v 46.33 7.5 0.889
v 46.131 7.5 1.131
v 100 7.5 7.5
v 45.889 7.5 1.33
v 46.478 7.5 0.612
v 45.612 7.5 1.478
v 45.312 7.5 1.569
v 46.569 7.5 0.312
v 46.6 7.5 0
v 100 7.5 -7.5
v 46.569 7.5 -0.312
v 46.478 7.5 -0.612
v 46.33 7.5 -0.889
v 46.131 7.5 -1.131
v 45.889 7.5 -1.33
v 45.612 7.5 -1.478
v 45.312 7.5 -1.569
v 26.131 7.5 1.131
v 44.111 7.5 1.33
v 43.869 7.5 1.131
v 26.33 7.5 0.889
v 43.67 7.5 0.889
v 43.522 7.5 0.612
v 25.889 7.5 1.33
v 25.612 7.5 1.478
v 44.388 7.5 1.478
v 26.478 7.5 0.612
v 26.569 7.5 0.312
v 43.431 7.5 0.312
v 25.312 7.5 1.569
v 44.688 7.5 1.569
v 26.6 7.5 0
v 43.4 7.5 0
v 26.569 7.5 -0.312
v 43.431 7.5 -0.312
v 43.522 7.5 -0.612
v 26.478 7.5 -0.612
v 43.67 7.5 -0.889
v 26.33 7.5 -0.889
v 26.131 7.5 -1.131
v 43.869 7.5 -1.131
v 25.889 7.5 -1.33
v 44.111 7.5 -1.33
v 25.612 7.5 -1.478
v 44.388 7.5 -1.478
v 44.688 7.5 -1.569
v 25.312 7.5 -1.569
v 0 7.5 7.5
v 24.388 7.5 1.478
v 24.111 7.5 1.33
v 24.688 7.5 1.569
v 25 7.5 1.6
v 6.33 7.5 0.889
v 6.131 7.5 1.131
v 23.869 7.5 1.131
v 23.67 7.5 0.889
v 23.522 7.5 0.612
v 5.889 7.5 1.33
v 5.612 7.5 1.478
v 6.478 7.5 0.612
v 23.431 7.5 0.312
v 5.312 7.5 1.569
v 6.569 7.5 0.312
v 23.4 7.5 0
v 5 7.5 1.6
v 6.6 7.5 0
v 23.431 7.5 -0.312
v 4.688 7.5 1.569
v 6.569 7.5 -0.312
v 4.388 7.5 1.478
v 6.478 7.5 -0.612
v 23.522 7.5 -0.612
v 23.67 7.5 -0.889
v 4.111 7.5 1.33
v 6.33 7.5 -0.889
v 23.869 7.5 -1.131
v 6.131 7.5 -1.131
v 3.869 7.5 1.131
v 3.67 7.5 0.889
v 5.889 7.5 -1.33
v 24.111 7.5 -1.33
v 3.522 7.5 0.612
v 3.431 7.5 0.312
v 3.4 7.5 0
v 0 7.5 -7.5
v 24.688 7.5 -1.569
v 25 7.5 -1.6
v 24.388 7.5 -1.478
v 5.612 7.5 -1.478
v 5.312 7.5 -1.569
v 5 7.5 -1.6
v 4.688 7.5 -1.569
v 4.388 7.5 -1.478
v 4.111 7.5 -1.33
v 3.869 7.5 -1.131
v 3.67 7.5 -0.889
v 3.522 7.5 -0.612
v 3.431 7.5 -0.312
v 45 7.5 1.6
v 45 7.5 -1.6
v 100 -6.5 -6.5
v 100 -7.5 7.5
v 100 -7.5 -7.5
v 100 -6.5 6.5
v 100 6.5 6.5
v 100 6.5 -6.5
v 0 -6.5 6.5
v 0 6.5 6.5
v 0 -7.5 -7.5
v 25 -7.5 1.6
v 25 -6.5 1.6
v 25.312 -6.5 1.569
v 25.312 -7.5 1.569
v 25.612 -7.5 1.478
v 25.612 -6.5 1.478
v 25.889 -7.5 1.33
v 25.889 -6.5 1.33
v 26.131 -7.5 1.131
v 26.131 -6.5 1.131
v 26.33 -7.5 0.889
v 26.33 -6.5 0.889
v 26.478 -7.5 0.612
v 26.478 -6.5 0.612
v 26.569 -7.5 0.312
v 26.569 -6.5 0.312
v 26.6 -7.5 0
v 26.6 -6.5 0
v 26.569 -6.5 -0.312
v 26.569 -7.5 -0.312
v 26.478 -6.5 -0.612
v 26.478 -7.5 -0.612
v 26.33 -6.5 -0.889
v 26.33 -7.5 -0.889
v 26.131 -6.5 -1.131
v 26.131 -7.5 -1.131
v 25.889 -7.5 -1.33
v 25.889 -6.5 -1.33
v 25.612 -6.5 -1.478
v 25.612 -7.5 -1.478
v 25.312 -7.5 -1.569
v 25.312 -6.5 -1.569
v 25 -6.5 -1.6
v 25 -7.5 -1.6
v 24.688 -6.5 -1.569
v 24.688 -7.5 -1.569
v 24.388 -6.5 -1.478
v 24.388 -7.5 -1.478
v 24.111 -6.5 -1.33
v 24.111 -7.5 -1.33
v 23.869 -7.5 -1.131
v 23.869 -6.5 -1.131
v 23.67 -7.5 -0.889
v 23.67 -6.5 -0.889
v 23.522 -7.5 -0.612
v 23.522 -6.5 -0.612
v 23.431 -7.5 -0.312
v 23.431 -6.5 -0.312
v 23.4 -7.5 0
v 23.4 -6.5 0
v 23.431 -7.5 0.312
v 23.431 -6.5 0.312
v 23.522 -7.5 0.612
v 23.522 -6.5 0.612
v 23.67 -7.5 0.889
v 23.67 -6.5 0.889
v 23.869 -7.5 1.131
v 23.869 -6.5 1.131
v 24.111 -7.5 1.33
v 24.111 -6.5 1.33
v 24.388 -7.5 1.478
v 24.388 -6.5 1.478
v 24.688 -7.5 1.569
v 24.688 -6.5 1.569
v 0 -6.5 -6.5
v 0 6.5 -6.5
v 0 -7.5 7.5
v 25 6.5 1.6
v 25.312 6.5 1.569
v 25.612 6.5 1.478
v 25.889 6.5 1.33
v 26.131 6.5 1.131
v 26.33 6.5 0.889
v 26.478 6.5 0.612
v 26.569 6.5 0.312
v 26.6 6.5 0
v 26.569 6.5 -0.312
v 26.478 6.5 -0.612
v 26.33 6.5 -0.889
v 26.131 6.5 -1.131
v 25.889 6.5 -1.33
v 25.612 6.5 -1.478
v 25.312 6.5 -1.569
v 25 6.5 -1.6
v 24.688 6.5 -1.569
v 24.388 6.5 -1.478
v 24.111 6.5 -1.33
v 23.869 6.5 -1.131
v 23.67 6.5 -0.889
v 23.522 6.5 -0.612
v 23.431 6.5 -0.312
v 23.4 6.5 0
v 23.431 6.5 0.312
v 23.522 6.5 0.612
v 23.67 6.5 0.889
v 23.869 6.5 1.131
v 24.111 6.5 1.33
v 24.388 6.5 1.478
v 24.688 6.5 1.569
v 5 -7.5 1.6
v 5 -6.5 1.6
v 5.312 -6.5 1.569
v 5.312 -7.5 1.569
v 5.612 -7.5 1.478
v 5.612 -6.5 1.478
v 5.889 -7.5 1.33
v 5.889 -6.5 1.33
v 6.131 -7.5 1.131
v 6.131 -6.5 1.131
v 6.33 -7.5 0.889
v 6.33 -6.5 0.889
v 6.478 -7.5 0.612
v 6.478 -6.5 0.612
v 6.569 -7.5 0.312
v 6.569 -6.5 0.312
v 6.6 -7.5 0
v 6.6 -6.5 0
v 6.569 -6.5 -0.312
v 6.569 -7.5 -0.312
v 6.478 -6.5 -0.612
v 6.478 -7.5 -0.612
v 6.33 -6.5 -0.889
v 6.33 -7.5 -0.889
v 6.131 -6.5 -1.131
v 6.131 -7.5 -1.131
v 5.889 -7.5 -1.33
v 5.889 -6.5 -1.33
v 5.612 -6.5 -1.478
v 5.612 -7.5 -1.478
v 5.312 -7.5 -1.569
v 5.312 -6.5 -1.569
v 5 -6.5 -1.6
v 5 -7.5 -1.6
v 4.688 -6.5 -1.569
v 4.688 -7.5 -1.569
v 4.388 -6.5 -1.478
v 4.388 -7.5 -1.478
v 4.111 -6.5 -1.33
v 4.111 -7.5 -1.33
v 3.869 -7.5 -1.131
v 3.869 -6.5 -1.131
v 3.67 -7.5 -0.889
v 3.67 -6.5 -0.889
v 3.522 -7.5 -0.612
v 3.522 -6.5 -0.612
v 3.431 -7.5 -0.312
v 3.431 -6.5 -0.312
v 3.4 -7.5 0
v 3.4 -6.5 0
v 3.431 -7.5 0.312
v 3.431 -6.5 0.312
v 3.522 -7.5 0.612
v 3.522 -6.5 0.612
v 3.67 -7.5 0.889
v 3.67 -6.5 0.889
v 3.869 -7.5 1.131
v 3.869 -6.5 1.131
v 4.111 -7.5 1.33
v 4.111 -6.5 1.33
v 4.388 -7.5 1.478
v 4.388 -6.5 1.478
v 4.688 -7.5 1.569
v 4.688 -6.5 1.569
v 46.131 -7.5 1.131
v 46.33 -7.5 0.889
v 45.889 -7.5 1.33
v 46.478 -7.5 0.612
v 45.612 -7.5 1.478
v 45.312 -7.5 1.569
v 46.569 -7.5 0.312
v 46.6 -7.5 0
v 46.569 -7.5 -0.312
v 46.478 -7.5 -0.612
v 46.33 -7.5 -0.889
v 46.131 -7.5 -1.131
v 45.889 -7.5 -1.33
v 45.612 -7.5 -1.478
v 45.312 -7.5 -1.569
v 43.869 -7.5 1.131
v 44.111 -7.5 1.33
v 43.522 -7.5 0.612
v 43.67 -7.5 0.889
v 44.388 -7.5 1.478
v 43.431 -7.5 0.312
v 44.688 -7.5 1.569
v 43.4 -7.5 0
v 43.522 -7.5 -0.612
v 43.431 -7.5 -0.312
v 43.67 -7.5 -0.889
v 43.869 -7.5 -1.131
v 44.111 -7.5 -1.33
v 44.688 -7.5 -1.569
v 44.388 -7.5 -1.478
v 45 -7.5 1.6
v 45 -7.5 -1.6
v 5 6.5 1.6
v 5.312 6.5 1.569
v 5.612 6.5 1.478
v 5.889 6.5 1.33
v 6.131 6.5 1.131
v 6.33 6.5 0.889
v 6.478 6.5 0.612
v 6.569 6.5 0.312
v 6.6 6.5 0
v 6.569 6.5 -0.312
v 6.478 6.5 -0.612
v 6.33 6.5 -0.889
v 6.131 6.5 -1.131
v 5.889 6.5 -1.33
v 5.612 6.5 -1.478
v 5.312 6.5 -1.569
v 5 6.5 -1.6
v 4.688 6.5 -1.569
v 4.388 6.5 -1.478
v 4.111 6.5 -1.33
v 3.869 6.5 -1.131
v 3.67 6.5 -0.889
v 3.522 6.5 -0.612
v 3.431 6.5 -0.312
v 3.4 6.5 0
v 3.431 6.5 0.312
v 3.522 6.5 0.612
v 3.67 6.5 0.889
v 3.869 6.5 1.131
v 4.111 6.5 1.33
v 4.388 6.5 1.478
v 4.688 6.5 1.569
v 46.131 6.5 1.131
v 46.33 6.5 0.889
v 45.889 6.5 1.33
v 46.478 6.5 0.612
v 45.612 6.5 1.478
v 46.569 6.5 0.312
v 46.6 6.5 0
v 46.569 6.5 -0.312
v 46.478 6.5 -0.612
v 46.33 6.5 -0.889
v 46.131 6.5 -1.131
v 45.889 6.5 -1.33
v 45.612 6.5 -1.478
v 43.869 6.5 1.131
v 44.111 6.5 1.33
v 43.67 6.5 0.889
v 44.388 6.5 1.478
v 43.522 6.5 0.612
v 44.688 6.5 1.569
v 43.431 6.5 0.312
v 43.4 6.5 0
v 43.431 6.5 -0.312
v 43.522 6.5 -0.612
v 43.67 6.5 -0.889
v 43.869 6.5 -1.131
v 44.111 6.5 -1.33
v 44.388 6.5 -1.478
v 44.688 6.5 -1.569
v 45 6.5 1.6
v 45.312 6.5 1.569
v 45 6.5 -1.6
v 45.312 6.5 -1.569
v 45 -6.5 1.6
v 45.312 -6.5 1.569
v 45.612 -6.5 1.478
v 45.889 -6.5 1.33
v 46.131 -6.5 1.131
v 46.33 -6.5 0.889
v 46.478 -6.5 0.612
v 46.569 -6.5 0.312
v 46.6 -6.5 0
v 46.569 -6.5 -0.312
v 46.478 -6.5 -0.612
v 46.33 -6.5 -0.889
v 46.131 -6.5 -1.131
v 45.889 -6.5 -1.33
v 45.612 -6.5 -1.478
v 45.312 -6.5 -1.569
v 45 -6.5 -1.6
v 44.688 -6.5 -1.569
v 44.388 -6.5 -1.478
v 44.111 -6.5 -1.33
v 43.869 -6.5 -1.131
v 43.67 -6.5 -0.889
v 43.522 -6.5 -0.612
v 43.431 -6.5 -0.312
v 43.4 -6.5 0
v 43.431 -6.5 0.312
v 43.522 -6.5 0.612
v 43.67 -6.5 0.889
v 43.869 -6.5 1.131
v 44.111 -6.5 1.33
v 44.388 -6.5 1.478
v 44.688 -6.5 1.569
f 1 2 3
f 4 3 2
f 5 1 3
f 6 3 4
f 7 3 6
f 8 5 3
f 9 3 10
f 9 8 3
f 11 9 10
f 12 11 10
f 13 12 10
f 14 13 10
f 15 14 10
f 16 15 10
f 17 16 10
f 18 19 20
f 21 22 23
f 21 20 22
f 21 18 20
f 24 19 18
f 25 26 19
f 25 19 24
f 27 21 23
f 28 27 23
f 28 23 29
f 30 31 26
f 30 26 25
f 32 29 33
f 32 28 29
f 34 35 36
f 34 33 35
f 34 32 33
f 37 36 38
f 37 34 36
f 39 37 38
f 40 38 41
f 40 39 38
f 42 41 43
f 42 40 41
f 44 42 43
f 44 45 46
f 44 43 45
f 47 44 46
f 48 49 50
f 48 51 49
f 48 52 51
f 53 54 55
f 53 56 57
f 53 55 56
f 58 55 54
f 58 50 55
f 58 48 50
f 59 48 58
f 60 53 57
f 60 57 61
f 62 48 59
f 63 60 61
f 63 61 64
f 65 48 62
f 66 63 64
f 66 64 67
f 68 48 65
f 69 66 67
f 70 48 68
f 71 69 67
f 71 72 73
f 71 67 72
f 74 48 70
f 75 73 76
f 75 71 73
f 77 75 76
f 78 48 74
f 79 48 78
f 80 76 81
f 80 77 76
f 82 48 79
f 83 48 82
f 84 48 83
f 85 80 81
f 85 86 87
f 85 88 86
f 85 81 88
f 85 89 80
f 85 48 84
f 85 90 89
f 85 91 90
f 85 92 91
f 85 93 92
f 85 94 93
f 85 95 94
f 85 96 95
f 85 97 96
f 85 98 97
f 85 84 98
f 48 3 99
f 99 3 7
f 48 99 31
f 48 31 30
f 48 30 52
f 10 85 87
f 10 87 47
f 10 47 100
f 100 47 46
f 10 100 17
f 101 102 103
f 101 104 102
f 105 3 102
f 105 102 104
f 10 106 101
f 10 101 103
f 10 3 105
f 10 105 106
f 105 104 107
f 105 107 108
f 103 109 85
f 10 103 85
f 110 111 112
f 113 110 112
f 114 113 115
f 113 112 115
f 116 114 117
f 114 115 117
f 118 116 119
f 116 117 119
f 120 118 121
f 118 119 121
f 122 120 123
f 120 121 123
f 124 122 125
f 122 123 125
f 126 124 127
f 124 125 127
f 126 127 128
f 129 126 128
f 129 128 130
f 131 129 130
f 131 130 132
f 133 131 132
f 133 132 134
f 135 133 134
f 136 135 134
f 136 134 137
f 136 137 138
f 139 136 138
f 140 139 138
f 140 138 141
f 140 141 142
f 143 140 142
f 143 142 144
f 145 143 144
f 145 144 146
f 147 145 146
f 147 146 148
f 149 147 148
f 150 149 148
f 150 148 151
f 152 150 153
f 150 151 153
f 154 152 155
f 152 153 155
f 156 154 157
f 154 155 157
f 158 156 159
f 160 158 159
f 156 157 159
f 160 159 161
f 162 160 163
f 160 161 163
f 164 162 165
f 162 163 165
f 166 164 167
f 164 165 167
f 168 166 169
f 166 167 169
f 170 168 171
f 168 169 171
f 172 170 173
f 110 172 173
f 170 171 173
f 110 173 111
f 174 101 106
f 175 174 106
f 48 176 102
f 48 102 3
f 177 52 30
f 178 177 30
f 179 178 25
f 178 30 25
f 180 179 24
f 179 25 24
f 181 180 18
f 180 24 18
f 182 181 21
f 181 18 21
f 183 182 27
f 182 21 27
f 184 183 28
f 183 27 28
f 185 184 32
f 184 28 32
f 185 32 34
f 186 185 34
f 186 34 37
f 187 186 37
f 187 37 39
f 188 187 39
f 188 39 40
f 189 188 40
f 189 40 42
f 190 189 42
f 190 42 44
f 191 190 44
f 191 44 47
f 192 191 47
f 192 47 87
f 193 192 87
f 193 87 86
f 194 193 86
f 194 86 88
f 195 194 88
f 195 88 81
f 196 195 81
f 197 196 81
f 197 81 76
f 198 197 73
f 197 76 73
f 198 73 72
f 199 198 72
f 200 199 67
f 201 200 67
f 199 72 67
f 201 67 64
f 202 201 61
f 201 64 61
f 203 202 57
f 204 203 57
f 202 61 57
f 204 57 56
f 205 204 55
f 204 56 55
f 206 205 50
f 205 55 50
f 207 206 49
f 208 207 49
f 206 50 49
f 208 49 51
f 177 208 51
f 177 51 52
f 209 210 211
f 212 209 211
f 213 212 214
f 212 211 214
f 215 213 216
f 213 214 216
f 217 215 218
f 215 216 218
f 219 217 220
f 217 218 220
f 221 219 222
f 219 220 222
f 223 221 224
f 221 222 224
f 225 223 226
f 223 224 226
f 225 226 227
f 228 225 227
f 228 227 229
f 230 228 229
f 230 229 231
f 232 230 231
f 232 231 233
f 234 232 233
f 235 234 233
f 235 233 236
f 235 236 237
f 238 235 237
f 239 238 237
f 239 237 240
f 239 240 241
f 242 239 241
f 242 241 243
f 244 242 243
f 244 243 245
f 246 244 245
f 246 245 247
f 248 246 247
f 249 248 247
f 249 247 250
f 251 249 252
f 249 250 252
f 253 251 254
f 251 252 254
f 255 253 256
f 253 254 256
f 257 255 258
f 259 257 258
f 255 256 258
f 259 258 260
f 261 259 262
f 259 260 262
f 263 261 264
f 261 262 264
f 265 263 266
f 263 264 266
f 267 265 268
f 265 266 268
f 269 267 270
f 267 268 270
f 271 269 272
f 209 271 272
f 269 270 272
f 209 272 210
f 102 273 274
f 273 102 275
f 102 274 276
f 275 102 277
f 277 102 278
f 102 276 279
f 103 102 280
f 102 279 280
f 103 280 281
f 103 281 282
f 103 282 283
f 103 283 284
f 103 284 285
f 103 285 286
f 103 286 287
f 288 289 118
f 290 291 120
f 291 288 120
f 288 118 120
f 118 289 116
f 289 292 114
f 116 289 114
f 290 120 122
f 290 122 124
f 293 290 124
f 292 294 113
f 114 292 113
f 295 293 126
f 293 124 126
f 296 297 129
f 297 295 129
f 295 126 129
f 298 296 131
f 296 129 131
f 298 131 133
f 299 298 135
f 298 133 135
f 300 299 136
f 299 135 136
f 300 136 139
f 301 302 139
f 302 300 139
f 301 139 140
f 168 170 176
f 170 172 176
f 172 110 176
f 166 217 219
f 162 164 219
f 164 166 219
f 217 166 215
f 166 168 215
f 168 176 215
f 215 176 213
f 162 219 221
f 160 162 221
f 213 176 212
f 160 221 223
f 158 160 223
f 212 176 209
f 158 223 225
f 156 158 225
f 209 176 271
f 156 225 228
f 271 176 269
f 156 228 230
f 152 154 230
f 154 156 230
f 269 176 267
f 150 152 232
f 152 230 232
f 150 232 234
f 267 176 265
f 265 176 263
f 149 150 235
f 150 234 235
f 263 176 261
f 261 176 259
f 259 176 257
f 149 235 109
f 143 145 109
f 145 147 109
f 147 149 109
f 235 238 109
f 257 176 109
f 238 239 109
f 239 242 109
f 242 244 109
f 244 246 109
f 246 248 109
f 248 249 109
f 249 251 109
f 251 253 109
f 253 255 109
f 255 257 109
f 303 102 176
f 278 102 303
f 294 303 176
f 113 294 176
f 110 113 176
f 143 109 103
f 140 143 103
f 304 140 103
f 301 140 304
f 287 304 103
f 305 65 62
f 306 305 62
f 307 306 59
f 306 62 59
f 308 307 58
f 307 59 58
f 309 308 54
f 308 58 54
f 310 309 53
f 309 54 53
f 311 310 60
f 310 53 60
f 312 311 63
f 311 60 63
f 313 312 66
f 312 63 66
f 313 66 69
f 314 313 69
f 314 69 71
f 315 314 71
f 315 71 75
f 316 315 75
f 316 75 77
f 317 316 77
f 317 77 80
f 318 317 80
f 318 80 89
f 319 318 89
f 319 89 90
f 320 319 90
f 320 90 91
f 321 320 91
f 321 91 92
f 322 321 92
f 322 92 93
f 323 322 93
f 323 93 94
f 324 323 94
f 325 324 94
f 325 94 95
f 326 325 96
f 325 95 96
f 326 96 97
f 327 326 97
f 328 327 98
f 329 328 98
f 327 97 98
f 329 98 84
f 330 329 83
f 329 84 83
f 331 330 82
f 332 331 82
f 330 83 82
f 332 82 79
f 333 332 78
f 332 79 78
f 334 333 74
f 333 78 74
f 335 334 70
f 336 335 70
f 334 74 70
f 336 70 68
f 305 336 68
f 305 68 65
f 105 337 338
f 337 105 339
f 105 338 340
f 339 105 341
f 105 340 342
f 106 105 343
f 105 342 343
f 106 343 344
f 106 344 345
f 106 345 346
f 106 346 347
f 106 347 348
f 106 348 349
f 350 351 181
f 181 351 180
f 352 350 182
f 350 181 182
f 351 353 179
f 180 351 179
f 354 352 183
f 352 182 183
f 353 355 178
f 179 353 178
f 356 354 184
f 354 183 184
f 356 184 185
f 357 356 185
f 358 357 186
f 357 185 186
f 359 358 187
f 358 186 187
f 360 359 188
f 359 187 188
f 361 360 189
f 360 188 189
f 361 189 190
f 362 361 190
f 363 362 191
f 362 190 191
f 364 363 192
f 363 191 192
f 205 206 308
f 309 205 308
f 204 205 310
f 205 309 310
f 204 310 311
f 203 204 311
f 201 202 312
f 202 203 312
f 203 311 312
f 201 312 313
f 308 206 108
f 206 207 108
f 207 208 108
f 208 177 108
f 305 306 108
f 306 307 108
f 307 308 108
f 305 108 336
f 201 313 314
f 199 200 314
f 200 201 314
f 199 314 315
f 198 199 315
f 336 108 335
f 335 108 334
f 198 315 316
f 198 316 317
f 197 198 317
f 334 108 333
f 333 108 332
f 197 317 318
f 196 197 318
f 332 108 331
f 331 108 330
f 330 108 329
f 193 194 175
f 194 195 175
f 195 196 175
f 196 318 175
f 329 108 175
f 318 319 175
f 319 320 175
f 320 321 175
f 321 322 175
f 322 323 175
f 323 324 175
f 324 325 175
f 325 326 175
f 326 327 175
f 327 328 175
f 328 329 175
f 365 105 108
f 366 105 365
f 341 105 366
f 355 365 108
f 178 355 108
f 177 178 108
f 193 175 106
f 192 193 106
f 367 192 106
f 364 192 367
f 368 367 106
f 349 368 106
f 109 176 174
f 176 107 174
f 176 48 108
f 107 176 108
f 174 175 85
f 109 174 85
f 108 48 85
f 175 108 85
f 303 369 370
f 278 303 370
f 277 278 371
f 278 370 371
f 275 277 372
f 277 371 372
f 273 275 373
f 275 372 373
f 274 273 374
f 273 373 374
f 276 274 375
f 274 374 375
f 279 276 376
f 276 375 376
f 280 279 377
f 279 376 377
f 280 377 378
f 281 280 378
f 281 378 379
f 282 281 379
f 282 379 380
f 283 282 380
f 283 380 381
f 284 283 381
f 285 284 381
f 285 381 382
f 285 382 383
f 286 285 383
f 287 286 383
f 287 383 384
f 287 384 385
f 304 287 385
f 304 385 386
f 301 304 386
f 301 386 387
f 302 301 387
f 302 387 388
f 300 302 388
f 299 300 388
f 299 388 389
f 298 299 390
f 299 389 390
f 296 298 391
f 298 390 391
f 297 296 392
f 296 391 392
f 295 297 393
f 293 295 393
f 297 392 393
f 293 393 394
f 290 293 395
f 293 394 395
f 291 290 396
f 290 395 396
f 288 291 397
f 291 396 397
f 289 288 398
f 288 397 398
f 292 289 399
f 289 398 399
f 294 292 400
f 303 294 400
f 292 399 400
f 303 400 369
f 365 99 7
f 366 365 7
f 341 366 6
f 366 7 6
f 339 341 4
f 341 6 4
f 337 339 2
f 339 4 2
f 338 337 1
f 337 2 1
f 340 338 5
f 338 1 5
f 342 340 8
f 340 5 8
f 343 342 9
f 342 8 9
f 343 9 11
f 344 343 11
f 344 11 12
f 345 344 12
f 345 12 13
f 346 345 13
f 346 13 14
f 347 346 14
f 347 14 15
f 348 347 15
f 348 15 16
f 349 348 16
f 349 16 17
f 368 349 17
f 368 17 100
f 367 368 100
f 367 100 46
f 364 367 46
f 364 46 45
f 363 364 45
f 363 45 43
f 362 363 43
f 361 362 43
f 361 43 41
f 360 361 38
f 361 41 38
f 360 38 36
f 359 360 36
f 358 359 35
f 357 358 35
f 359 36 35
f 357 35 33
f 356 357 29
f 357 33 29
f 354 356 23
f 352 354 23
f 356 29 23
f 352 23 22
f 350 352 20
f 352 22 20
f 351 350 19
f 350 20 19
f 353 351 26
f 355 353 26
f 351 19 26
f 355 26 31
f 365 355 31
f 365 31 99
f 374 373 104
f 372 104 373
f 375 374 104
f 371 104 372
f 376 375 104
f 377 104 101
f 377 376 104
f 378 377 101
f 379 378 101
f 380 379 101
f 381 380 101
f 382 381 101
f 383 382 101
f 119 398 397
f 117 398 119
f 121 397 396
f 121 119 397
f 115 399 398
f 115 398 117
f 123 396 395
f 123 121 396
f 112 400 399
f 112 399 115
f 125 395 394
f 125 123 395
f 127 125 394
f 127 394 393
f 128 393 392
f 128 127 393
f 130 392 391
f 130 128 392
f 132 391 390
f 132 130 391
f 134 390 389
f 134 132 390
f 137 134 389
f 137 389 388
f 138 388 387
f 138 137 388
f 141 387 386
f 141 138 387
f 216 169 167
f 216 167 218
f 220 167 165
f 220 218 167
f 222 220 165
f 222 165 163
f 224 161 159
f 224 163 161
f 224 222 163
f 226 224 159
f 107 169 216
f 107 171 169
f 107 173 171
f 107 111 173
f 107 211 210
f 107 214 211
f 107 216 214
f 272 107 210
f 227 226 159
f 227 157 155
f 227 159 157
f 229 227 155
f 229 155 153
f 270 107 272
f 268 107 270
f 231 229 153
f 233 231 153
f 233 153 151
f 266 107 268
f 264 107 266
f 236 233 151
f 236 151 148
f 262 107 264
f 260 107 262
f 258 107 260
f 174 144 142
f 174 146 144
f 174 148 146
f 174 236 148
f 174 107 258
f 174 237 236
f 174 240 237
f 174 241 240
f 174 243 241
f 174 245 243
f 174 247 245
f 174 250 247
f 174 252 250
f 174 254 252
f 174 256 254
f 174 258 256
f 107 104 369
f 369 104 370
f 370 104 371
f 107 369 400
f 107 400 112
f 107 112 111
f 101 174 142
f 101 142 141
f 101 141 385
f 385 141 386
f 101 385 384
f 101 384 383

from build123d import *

# Parameters (mm, degrees)
SKETCH_11_W         = 15
SKETCH_11_H         = 15
SKETCH_11_W_2       = 13
SKETCH_11_H_2       = 13
F_15X15X1_1_DEPTH   = 100
SKETCH_12_R         = 1.6
CUT_EXTRUDE_1_DEPTH = 102.396498953


with BuildPart() as part:
    # 草图11 → 铝管 15X15X1(1) (new body)
    with BuildSketch(Plane(origin=(0, 0, 0), x_dir=(0, 0, -1), z_dir=(1, 0, 0))):
        Rectangle(SKETCH_11_W, SKETCH_11_H)
        Rectangle(SKETCH_11_W_2, SKETCH_11_H_2, mode=Mode.SUBTRACT)
    extrude(amount=F_15X15X1_1_DEPTH)

    # 草图12 → 切除-拉伸1 (cut, through all)
    with BuildSketch(Plane(origin=(0, 7.5, 0), x_dir=(1, 0, 0), z_dir=(0, 1, 0))):
        with Locations(Location((45, 0, 0), (0, 0, 270))):
            Circle(SKETCH_12_R)
        with Locations(Location((25, 0, 0), (0, 0, 270))):
            Circle(SKETCH_12_R)
        with Locations(Location((5, 0, 0), (0, 0, 270))):
            Circle(SKETCH_12_R)
    extrude(amount=-CUT_EXTRUDE_1_DEPTH, mode=Mode.SUBTRACT)


solid = part.part
